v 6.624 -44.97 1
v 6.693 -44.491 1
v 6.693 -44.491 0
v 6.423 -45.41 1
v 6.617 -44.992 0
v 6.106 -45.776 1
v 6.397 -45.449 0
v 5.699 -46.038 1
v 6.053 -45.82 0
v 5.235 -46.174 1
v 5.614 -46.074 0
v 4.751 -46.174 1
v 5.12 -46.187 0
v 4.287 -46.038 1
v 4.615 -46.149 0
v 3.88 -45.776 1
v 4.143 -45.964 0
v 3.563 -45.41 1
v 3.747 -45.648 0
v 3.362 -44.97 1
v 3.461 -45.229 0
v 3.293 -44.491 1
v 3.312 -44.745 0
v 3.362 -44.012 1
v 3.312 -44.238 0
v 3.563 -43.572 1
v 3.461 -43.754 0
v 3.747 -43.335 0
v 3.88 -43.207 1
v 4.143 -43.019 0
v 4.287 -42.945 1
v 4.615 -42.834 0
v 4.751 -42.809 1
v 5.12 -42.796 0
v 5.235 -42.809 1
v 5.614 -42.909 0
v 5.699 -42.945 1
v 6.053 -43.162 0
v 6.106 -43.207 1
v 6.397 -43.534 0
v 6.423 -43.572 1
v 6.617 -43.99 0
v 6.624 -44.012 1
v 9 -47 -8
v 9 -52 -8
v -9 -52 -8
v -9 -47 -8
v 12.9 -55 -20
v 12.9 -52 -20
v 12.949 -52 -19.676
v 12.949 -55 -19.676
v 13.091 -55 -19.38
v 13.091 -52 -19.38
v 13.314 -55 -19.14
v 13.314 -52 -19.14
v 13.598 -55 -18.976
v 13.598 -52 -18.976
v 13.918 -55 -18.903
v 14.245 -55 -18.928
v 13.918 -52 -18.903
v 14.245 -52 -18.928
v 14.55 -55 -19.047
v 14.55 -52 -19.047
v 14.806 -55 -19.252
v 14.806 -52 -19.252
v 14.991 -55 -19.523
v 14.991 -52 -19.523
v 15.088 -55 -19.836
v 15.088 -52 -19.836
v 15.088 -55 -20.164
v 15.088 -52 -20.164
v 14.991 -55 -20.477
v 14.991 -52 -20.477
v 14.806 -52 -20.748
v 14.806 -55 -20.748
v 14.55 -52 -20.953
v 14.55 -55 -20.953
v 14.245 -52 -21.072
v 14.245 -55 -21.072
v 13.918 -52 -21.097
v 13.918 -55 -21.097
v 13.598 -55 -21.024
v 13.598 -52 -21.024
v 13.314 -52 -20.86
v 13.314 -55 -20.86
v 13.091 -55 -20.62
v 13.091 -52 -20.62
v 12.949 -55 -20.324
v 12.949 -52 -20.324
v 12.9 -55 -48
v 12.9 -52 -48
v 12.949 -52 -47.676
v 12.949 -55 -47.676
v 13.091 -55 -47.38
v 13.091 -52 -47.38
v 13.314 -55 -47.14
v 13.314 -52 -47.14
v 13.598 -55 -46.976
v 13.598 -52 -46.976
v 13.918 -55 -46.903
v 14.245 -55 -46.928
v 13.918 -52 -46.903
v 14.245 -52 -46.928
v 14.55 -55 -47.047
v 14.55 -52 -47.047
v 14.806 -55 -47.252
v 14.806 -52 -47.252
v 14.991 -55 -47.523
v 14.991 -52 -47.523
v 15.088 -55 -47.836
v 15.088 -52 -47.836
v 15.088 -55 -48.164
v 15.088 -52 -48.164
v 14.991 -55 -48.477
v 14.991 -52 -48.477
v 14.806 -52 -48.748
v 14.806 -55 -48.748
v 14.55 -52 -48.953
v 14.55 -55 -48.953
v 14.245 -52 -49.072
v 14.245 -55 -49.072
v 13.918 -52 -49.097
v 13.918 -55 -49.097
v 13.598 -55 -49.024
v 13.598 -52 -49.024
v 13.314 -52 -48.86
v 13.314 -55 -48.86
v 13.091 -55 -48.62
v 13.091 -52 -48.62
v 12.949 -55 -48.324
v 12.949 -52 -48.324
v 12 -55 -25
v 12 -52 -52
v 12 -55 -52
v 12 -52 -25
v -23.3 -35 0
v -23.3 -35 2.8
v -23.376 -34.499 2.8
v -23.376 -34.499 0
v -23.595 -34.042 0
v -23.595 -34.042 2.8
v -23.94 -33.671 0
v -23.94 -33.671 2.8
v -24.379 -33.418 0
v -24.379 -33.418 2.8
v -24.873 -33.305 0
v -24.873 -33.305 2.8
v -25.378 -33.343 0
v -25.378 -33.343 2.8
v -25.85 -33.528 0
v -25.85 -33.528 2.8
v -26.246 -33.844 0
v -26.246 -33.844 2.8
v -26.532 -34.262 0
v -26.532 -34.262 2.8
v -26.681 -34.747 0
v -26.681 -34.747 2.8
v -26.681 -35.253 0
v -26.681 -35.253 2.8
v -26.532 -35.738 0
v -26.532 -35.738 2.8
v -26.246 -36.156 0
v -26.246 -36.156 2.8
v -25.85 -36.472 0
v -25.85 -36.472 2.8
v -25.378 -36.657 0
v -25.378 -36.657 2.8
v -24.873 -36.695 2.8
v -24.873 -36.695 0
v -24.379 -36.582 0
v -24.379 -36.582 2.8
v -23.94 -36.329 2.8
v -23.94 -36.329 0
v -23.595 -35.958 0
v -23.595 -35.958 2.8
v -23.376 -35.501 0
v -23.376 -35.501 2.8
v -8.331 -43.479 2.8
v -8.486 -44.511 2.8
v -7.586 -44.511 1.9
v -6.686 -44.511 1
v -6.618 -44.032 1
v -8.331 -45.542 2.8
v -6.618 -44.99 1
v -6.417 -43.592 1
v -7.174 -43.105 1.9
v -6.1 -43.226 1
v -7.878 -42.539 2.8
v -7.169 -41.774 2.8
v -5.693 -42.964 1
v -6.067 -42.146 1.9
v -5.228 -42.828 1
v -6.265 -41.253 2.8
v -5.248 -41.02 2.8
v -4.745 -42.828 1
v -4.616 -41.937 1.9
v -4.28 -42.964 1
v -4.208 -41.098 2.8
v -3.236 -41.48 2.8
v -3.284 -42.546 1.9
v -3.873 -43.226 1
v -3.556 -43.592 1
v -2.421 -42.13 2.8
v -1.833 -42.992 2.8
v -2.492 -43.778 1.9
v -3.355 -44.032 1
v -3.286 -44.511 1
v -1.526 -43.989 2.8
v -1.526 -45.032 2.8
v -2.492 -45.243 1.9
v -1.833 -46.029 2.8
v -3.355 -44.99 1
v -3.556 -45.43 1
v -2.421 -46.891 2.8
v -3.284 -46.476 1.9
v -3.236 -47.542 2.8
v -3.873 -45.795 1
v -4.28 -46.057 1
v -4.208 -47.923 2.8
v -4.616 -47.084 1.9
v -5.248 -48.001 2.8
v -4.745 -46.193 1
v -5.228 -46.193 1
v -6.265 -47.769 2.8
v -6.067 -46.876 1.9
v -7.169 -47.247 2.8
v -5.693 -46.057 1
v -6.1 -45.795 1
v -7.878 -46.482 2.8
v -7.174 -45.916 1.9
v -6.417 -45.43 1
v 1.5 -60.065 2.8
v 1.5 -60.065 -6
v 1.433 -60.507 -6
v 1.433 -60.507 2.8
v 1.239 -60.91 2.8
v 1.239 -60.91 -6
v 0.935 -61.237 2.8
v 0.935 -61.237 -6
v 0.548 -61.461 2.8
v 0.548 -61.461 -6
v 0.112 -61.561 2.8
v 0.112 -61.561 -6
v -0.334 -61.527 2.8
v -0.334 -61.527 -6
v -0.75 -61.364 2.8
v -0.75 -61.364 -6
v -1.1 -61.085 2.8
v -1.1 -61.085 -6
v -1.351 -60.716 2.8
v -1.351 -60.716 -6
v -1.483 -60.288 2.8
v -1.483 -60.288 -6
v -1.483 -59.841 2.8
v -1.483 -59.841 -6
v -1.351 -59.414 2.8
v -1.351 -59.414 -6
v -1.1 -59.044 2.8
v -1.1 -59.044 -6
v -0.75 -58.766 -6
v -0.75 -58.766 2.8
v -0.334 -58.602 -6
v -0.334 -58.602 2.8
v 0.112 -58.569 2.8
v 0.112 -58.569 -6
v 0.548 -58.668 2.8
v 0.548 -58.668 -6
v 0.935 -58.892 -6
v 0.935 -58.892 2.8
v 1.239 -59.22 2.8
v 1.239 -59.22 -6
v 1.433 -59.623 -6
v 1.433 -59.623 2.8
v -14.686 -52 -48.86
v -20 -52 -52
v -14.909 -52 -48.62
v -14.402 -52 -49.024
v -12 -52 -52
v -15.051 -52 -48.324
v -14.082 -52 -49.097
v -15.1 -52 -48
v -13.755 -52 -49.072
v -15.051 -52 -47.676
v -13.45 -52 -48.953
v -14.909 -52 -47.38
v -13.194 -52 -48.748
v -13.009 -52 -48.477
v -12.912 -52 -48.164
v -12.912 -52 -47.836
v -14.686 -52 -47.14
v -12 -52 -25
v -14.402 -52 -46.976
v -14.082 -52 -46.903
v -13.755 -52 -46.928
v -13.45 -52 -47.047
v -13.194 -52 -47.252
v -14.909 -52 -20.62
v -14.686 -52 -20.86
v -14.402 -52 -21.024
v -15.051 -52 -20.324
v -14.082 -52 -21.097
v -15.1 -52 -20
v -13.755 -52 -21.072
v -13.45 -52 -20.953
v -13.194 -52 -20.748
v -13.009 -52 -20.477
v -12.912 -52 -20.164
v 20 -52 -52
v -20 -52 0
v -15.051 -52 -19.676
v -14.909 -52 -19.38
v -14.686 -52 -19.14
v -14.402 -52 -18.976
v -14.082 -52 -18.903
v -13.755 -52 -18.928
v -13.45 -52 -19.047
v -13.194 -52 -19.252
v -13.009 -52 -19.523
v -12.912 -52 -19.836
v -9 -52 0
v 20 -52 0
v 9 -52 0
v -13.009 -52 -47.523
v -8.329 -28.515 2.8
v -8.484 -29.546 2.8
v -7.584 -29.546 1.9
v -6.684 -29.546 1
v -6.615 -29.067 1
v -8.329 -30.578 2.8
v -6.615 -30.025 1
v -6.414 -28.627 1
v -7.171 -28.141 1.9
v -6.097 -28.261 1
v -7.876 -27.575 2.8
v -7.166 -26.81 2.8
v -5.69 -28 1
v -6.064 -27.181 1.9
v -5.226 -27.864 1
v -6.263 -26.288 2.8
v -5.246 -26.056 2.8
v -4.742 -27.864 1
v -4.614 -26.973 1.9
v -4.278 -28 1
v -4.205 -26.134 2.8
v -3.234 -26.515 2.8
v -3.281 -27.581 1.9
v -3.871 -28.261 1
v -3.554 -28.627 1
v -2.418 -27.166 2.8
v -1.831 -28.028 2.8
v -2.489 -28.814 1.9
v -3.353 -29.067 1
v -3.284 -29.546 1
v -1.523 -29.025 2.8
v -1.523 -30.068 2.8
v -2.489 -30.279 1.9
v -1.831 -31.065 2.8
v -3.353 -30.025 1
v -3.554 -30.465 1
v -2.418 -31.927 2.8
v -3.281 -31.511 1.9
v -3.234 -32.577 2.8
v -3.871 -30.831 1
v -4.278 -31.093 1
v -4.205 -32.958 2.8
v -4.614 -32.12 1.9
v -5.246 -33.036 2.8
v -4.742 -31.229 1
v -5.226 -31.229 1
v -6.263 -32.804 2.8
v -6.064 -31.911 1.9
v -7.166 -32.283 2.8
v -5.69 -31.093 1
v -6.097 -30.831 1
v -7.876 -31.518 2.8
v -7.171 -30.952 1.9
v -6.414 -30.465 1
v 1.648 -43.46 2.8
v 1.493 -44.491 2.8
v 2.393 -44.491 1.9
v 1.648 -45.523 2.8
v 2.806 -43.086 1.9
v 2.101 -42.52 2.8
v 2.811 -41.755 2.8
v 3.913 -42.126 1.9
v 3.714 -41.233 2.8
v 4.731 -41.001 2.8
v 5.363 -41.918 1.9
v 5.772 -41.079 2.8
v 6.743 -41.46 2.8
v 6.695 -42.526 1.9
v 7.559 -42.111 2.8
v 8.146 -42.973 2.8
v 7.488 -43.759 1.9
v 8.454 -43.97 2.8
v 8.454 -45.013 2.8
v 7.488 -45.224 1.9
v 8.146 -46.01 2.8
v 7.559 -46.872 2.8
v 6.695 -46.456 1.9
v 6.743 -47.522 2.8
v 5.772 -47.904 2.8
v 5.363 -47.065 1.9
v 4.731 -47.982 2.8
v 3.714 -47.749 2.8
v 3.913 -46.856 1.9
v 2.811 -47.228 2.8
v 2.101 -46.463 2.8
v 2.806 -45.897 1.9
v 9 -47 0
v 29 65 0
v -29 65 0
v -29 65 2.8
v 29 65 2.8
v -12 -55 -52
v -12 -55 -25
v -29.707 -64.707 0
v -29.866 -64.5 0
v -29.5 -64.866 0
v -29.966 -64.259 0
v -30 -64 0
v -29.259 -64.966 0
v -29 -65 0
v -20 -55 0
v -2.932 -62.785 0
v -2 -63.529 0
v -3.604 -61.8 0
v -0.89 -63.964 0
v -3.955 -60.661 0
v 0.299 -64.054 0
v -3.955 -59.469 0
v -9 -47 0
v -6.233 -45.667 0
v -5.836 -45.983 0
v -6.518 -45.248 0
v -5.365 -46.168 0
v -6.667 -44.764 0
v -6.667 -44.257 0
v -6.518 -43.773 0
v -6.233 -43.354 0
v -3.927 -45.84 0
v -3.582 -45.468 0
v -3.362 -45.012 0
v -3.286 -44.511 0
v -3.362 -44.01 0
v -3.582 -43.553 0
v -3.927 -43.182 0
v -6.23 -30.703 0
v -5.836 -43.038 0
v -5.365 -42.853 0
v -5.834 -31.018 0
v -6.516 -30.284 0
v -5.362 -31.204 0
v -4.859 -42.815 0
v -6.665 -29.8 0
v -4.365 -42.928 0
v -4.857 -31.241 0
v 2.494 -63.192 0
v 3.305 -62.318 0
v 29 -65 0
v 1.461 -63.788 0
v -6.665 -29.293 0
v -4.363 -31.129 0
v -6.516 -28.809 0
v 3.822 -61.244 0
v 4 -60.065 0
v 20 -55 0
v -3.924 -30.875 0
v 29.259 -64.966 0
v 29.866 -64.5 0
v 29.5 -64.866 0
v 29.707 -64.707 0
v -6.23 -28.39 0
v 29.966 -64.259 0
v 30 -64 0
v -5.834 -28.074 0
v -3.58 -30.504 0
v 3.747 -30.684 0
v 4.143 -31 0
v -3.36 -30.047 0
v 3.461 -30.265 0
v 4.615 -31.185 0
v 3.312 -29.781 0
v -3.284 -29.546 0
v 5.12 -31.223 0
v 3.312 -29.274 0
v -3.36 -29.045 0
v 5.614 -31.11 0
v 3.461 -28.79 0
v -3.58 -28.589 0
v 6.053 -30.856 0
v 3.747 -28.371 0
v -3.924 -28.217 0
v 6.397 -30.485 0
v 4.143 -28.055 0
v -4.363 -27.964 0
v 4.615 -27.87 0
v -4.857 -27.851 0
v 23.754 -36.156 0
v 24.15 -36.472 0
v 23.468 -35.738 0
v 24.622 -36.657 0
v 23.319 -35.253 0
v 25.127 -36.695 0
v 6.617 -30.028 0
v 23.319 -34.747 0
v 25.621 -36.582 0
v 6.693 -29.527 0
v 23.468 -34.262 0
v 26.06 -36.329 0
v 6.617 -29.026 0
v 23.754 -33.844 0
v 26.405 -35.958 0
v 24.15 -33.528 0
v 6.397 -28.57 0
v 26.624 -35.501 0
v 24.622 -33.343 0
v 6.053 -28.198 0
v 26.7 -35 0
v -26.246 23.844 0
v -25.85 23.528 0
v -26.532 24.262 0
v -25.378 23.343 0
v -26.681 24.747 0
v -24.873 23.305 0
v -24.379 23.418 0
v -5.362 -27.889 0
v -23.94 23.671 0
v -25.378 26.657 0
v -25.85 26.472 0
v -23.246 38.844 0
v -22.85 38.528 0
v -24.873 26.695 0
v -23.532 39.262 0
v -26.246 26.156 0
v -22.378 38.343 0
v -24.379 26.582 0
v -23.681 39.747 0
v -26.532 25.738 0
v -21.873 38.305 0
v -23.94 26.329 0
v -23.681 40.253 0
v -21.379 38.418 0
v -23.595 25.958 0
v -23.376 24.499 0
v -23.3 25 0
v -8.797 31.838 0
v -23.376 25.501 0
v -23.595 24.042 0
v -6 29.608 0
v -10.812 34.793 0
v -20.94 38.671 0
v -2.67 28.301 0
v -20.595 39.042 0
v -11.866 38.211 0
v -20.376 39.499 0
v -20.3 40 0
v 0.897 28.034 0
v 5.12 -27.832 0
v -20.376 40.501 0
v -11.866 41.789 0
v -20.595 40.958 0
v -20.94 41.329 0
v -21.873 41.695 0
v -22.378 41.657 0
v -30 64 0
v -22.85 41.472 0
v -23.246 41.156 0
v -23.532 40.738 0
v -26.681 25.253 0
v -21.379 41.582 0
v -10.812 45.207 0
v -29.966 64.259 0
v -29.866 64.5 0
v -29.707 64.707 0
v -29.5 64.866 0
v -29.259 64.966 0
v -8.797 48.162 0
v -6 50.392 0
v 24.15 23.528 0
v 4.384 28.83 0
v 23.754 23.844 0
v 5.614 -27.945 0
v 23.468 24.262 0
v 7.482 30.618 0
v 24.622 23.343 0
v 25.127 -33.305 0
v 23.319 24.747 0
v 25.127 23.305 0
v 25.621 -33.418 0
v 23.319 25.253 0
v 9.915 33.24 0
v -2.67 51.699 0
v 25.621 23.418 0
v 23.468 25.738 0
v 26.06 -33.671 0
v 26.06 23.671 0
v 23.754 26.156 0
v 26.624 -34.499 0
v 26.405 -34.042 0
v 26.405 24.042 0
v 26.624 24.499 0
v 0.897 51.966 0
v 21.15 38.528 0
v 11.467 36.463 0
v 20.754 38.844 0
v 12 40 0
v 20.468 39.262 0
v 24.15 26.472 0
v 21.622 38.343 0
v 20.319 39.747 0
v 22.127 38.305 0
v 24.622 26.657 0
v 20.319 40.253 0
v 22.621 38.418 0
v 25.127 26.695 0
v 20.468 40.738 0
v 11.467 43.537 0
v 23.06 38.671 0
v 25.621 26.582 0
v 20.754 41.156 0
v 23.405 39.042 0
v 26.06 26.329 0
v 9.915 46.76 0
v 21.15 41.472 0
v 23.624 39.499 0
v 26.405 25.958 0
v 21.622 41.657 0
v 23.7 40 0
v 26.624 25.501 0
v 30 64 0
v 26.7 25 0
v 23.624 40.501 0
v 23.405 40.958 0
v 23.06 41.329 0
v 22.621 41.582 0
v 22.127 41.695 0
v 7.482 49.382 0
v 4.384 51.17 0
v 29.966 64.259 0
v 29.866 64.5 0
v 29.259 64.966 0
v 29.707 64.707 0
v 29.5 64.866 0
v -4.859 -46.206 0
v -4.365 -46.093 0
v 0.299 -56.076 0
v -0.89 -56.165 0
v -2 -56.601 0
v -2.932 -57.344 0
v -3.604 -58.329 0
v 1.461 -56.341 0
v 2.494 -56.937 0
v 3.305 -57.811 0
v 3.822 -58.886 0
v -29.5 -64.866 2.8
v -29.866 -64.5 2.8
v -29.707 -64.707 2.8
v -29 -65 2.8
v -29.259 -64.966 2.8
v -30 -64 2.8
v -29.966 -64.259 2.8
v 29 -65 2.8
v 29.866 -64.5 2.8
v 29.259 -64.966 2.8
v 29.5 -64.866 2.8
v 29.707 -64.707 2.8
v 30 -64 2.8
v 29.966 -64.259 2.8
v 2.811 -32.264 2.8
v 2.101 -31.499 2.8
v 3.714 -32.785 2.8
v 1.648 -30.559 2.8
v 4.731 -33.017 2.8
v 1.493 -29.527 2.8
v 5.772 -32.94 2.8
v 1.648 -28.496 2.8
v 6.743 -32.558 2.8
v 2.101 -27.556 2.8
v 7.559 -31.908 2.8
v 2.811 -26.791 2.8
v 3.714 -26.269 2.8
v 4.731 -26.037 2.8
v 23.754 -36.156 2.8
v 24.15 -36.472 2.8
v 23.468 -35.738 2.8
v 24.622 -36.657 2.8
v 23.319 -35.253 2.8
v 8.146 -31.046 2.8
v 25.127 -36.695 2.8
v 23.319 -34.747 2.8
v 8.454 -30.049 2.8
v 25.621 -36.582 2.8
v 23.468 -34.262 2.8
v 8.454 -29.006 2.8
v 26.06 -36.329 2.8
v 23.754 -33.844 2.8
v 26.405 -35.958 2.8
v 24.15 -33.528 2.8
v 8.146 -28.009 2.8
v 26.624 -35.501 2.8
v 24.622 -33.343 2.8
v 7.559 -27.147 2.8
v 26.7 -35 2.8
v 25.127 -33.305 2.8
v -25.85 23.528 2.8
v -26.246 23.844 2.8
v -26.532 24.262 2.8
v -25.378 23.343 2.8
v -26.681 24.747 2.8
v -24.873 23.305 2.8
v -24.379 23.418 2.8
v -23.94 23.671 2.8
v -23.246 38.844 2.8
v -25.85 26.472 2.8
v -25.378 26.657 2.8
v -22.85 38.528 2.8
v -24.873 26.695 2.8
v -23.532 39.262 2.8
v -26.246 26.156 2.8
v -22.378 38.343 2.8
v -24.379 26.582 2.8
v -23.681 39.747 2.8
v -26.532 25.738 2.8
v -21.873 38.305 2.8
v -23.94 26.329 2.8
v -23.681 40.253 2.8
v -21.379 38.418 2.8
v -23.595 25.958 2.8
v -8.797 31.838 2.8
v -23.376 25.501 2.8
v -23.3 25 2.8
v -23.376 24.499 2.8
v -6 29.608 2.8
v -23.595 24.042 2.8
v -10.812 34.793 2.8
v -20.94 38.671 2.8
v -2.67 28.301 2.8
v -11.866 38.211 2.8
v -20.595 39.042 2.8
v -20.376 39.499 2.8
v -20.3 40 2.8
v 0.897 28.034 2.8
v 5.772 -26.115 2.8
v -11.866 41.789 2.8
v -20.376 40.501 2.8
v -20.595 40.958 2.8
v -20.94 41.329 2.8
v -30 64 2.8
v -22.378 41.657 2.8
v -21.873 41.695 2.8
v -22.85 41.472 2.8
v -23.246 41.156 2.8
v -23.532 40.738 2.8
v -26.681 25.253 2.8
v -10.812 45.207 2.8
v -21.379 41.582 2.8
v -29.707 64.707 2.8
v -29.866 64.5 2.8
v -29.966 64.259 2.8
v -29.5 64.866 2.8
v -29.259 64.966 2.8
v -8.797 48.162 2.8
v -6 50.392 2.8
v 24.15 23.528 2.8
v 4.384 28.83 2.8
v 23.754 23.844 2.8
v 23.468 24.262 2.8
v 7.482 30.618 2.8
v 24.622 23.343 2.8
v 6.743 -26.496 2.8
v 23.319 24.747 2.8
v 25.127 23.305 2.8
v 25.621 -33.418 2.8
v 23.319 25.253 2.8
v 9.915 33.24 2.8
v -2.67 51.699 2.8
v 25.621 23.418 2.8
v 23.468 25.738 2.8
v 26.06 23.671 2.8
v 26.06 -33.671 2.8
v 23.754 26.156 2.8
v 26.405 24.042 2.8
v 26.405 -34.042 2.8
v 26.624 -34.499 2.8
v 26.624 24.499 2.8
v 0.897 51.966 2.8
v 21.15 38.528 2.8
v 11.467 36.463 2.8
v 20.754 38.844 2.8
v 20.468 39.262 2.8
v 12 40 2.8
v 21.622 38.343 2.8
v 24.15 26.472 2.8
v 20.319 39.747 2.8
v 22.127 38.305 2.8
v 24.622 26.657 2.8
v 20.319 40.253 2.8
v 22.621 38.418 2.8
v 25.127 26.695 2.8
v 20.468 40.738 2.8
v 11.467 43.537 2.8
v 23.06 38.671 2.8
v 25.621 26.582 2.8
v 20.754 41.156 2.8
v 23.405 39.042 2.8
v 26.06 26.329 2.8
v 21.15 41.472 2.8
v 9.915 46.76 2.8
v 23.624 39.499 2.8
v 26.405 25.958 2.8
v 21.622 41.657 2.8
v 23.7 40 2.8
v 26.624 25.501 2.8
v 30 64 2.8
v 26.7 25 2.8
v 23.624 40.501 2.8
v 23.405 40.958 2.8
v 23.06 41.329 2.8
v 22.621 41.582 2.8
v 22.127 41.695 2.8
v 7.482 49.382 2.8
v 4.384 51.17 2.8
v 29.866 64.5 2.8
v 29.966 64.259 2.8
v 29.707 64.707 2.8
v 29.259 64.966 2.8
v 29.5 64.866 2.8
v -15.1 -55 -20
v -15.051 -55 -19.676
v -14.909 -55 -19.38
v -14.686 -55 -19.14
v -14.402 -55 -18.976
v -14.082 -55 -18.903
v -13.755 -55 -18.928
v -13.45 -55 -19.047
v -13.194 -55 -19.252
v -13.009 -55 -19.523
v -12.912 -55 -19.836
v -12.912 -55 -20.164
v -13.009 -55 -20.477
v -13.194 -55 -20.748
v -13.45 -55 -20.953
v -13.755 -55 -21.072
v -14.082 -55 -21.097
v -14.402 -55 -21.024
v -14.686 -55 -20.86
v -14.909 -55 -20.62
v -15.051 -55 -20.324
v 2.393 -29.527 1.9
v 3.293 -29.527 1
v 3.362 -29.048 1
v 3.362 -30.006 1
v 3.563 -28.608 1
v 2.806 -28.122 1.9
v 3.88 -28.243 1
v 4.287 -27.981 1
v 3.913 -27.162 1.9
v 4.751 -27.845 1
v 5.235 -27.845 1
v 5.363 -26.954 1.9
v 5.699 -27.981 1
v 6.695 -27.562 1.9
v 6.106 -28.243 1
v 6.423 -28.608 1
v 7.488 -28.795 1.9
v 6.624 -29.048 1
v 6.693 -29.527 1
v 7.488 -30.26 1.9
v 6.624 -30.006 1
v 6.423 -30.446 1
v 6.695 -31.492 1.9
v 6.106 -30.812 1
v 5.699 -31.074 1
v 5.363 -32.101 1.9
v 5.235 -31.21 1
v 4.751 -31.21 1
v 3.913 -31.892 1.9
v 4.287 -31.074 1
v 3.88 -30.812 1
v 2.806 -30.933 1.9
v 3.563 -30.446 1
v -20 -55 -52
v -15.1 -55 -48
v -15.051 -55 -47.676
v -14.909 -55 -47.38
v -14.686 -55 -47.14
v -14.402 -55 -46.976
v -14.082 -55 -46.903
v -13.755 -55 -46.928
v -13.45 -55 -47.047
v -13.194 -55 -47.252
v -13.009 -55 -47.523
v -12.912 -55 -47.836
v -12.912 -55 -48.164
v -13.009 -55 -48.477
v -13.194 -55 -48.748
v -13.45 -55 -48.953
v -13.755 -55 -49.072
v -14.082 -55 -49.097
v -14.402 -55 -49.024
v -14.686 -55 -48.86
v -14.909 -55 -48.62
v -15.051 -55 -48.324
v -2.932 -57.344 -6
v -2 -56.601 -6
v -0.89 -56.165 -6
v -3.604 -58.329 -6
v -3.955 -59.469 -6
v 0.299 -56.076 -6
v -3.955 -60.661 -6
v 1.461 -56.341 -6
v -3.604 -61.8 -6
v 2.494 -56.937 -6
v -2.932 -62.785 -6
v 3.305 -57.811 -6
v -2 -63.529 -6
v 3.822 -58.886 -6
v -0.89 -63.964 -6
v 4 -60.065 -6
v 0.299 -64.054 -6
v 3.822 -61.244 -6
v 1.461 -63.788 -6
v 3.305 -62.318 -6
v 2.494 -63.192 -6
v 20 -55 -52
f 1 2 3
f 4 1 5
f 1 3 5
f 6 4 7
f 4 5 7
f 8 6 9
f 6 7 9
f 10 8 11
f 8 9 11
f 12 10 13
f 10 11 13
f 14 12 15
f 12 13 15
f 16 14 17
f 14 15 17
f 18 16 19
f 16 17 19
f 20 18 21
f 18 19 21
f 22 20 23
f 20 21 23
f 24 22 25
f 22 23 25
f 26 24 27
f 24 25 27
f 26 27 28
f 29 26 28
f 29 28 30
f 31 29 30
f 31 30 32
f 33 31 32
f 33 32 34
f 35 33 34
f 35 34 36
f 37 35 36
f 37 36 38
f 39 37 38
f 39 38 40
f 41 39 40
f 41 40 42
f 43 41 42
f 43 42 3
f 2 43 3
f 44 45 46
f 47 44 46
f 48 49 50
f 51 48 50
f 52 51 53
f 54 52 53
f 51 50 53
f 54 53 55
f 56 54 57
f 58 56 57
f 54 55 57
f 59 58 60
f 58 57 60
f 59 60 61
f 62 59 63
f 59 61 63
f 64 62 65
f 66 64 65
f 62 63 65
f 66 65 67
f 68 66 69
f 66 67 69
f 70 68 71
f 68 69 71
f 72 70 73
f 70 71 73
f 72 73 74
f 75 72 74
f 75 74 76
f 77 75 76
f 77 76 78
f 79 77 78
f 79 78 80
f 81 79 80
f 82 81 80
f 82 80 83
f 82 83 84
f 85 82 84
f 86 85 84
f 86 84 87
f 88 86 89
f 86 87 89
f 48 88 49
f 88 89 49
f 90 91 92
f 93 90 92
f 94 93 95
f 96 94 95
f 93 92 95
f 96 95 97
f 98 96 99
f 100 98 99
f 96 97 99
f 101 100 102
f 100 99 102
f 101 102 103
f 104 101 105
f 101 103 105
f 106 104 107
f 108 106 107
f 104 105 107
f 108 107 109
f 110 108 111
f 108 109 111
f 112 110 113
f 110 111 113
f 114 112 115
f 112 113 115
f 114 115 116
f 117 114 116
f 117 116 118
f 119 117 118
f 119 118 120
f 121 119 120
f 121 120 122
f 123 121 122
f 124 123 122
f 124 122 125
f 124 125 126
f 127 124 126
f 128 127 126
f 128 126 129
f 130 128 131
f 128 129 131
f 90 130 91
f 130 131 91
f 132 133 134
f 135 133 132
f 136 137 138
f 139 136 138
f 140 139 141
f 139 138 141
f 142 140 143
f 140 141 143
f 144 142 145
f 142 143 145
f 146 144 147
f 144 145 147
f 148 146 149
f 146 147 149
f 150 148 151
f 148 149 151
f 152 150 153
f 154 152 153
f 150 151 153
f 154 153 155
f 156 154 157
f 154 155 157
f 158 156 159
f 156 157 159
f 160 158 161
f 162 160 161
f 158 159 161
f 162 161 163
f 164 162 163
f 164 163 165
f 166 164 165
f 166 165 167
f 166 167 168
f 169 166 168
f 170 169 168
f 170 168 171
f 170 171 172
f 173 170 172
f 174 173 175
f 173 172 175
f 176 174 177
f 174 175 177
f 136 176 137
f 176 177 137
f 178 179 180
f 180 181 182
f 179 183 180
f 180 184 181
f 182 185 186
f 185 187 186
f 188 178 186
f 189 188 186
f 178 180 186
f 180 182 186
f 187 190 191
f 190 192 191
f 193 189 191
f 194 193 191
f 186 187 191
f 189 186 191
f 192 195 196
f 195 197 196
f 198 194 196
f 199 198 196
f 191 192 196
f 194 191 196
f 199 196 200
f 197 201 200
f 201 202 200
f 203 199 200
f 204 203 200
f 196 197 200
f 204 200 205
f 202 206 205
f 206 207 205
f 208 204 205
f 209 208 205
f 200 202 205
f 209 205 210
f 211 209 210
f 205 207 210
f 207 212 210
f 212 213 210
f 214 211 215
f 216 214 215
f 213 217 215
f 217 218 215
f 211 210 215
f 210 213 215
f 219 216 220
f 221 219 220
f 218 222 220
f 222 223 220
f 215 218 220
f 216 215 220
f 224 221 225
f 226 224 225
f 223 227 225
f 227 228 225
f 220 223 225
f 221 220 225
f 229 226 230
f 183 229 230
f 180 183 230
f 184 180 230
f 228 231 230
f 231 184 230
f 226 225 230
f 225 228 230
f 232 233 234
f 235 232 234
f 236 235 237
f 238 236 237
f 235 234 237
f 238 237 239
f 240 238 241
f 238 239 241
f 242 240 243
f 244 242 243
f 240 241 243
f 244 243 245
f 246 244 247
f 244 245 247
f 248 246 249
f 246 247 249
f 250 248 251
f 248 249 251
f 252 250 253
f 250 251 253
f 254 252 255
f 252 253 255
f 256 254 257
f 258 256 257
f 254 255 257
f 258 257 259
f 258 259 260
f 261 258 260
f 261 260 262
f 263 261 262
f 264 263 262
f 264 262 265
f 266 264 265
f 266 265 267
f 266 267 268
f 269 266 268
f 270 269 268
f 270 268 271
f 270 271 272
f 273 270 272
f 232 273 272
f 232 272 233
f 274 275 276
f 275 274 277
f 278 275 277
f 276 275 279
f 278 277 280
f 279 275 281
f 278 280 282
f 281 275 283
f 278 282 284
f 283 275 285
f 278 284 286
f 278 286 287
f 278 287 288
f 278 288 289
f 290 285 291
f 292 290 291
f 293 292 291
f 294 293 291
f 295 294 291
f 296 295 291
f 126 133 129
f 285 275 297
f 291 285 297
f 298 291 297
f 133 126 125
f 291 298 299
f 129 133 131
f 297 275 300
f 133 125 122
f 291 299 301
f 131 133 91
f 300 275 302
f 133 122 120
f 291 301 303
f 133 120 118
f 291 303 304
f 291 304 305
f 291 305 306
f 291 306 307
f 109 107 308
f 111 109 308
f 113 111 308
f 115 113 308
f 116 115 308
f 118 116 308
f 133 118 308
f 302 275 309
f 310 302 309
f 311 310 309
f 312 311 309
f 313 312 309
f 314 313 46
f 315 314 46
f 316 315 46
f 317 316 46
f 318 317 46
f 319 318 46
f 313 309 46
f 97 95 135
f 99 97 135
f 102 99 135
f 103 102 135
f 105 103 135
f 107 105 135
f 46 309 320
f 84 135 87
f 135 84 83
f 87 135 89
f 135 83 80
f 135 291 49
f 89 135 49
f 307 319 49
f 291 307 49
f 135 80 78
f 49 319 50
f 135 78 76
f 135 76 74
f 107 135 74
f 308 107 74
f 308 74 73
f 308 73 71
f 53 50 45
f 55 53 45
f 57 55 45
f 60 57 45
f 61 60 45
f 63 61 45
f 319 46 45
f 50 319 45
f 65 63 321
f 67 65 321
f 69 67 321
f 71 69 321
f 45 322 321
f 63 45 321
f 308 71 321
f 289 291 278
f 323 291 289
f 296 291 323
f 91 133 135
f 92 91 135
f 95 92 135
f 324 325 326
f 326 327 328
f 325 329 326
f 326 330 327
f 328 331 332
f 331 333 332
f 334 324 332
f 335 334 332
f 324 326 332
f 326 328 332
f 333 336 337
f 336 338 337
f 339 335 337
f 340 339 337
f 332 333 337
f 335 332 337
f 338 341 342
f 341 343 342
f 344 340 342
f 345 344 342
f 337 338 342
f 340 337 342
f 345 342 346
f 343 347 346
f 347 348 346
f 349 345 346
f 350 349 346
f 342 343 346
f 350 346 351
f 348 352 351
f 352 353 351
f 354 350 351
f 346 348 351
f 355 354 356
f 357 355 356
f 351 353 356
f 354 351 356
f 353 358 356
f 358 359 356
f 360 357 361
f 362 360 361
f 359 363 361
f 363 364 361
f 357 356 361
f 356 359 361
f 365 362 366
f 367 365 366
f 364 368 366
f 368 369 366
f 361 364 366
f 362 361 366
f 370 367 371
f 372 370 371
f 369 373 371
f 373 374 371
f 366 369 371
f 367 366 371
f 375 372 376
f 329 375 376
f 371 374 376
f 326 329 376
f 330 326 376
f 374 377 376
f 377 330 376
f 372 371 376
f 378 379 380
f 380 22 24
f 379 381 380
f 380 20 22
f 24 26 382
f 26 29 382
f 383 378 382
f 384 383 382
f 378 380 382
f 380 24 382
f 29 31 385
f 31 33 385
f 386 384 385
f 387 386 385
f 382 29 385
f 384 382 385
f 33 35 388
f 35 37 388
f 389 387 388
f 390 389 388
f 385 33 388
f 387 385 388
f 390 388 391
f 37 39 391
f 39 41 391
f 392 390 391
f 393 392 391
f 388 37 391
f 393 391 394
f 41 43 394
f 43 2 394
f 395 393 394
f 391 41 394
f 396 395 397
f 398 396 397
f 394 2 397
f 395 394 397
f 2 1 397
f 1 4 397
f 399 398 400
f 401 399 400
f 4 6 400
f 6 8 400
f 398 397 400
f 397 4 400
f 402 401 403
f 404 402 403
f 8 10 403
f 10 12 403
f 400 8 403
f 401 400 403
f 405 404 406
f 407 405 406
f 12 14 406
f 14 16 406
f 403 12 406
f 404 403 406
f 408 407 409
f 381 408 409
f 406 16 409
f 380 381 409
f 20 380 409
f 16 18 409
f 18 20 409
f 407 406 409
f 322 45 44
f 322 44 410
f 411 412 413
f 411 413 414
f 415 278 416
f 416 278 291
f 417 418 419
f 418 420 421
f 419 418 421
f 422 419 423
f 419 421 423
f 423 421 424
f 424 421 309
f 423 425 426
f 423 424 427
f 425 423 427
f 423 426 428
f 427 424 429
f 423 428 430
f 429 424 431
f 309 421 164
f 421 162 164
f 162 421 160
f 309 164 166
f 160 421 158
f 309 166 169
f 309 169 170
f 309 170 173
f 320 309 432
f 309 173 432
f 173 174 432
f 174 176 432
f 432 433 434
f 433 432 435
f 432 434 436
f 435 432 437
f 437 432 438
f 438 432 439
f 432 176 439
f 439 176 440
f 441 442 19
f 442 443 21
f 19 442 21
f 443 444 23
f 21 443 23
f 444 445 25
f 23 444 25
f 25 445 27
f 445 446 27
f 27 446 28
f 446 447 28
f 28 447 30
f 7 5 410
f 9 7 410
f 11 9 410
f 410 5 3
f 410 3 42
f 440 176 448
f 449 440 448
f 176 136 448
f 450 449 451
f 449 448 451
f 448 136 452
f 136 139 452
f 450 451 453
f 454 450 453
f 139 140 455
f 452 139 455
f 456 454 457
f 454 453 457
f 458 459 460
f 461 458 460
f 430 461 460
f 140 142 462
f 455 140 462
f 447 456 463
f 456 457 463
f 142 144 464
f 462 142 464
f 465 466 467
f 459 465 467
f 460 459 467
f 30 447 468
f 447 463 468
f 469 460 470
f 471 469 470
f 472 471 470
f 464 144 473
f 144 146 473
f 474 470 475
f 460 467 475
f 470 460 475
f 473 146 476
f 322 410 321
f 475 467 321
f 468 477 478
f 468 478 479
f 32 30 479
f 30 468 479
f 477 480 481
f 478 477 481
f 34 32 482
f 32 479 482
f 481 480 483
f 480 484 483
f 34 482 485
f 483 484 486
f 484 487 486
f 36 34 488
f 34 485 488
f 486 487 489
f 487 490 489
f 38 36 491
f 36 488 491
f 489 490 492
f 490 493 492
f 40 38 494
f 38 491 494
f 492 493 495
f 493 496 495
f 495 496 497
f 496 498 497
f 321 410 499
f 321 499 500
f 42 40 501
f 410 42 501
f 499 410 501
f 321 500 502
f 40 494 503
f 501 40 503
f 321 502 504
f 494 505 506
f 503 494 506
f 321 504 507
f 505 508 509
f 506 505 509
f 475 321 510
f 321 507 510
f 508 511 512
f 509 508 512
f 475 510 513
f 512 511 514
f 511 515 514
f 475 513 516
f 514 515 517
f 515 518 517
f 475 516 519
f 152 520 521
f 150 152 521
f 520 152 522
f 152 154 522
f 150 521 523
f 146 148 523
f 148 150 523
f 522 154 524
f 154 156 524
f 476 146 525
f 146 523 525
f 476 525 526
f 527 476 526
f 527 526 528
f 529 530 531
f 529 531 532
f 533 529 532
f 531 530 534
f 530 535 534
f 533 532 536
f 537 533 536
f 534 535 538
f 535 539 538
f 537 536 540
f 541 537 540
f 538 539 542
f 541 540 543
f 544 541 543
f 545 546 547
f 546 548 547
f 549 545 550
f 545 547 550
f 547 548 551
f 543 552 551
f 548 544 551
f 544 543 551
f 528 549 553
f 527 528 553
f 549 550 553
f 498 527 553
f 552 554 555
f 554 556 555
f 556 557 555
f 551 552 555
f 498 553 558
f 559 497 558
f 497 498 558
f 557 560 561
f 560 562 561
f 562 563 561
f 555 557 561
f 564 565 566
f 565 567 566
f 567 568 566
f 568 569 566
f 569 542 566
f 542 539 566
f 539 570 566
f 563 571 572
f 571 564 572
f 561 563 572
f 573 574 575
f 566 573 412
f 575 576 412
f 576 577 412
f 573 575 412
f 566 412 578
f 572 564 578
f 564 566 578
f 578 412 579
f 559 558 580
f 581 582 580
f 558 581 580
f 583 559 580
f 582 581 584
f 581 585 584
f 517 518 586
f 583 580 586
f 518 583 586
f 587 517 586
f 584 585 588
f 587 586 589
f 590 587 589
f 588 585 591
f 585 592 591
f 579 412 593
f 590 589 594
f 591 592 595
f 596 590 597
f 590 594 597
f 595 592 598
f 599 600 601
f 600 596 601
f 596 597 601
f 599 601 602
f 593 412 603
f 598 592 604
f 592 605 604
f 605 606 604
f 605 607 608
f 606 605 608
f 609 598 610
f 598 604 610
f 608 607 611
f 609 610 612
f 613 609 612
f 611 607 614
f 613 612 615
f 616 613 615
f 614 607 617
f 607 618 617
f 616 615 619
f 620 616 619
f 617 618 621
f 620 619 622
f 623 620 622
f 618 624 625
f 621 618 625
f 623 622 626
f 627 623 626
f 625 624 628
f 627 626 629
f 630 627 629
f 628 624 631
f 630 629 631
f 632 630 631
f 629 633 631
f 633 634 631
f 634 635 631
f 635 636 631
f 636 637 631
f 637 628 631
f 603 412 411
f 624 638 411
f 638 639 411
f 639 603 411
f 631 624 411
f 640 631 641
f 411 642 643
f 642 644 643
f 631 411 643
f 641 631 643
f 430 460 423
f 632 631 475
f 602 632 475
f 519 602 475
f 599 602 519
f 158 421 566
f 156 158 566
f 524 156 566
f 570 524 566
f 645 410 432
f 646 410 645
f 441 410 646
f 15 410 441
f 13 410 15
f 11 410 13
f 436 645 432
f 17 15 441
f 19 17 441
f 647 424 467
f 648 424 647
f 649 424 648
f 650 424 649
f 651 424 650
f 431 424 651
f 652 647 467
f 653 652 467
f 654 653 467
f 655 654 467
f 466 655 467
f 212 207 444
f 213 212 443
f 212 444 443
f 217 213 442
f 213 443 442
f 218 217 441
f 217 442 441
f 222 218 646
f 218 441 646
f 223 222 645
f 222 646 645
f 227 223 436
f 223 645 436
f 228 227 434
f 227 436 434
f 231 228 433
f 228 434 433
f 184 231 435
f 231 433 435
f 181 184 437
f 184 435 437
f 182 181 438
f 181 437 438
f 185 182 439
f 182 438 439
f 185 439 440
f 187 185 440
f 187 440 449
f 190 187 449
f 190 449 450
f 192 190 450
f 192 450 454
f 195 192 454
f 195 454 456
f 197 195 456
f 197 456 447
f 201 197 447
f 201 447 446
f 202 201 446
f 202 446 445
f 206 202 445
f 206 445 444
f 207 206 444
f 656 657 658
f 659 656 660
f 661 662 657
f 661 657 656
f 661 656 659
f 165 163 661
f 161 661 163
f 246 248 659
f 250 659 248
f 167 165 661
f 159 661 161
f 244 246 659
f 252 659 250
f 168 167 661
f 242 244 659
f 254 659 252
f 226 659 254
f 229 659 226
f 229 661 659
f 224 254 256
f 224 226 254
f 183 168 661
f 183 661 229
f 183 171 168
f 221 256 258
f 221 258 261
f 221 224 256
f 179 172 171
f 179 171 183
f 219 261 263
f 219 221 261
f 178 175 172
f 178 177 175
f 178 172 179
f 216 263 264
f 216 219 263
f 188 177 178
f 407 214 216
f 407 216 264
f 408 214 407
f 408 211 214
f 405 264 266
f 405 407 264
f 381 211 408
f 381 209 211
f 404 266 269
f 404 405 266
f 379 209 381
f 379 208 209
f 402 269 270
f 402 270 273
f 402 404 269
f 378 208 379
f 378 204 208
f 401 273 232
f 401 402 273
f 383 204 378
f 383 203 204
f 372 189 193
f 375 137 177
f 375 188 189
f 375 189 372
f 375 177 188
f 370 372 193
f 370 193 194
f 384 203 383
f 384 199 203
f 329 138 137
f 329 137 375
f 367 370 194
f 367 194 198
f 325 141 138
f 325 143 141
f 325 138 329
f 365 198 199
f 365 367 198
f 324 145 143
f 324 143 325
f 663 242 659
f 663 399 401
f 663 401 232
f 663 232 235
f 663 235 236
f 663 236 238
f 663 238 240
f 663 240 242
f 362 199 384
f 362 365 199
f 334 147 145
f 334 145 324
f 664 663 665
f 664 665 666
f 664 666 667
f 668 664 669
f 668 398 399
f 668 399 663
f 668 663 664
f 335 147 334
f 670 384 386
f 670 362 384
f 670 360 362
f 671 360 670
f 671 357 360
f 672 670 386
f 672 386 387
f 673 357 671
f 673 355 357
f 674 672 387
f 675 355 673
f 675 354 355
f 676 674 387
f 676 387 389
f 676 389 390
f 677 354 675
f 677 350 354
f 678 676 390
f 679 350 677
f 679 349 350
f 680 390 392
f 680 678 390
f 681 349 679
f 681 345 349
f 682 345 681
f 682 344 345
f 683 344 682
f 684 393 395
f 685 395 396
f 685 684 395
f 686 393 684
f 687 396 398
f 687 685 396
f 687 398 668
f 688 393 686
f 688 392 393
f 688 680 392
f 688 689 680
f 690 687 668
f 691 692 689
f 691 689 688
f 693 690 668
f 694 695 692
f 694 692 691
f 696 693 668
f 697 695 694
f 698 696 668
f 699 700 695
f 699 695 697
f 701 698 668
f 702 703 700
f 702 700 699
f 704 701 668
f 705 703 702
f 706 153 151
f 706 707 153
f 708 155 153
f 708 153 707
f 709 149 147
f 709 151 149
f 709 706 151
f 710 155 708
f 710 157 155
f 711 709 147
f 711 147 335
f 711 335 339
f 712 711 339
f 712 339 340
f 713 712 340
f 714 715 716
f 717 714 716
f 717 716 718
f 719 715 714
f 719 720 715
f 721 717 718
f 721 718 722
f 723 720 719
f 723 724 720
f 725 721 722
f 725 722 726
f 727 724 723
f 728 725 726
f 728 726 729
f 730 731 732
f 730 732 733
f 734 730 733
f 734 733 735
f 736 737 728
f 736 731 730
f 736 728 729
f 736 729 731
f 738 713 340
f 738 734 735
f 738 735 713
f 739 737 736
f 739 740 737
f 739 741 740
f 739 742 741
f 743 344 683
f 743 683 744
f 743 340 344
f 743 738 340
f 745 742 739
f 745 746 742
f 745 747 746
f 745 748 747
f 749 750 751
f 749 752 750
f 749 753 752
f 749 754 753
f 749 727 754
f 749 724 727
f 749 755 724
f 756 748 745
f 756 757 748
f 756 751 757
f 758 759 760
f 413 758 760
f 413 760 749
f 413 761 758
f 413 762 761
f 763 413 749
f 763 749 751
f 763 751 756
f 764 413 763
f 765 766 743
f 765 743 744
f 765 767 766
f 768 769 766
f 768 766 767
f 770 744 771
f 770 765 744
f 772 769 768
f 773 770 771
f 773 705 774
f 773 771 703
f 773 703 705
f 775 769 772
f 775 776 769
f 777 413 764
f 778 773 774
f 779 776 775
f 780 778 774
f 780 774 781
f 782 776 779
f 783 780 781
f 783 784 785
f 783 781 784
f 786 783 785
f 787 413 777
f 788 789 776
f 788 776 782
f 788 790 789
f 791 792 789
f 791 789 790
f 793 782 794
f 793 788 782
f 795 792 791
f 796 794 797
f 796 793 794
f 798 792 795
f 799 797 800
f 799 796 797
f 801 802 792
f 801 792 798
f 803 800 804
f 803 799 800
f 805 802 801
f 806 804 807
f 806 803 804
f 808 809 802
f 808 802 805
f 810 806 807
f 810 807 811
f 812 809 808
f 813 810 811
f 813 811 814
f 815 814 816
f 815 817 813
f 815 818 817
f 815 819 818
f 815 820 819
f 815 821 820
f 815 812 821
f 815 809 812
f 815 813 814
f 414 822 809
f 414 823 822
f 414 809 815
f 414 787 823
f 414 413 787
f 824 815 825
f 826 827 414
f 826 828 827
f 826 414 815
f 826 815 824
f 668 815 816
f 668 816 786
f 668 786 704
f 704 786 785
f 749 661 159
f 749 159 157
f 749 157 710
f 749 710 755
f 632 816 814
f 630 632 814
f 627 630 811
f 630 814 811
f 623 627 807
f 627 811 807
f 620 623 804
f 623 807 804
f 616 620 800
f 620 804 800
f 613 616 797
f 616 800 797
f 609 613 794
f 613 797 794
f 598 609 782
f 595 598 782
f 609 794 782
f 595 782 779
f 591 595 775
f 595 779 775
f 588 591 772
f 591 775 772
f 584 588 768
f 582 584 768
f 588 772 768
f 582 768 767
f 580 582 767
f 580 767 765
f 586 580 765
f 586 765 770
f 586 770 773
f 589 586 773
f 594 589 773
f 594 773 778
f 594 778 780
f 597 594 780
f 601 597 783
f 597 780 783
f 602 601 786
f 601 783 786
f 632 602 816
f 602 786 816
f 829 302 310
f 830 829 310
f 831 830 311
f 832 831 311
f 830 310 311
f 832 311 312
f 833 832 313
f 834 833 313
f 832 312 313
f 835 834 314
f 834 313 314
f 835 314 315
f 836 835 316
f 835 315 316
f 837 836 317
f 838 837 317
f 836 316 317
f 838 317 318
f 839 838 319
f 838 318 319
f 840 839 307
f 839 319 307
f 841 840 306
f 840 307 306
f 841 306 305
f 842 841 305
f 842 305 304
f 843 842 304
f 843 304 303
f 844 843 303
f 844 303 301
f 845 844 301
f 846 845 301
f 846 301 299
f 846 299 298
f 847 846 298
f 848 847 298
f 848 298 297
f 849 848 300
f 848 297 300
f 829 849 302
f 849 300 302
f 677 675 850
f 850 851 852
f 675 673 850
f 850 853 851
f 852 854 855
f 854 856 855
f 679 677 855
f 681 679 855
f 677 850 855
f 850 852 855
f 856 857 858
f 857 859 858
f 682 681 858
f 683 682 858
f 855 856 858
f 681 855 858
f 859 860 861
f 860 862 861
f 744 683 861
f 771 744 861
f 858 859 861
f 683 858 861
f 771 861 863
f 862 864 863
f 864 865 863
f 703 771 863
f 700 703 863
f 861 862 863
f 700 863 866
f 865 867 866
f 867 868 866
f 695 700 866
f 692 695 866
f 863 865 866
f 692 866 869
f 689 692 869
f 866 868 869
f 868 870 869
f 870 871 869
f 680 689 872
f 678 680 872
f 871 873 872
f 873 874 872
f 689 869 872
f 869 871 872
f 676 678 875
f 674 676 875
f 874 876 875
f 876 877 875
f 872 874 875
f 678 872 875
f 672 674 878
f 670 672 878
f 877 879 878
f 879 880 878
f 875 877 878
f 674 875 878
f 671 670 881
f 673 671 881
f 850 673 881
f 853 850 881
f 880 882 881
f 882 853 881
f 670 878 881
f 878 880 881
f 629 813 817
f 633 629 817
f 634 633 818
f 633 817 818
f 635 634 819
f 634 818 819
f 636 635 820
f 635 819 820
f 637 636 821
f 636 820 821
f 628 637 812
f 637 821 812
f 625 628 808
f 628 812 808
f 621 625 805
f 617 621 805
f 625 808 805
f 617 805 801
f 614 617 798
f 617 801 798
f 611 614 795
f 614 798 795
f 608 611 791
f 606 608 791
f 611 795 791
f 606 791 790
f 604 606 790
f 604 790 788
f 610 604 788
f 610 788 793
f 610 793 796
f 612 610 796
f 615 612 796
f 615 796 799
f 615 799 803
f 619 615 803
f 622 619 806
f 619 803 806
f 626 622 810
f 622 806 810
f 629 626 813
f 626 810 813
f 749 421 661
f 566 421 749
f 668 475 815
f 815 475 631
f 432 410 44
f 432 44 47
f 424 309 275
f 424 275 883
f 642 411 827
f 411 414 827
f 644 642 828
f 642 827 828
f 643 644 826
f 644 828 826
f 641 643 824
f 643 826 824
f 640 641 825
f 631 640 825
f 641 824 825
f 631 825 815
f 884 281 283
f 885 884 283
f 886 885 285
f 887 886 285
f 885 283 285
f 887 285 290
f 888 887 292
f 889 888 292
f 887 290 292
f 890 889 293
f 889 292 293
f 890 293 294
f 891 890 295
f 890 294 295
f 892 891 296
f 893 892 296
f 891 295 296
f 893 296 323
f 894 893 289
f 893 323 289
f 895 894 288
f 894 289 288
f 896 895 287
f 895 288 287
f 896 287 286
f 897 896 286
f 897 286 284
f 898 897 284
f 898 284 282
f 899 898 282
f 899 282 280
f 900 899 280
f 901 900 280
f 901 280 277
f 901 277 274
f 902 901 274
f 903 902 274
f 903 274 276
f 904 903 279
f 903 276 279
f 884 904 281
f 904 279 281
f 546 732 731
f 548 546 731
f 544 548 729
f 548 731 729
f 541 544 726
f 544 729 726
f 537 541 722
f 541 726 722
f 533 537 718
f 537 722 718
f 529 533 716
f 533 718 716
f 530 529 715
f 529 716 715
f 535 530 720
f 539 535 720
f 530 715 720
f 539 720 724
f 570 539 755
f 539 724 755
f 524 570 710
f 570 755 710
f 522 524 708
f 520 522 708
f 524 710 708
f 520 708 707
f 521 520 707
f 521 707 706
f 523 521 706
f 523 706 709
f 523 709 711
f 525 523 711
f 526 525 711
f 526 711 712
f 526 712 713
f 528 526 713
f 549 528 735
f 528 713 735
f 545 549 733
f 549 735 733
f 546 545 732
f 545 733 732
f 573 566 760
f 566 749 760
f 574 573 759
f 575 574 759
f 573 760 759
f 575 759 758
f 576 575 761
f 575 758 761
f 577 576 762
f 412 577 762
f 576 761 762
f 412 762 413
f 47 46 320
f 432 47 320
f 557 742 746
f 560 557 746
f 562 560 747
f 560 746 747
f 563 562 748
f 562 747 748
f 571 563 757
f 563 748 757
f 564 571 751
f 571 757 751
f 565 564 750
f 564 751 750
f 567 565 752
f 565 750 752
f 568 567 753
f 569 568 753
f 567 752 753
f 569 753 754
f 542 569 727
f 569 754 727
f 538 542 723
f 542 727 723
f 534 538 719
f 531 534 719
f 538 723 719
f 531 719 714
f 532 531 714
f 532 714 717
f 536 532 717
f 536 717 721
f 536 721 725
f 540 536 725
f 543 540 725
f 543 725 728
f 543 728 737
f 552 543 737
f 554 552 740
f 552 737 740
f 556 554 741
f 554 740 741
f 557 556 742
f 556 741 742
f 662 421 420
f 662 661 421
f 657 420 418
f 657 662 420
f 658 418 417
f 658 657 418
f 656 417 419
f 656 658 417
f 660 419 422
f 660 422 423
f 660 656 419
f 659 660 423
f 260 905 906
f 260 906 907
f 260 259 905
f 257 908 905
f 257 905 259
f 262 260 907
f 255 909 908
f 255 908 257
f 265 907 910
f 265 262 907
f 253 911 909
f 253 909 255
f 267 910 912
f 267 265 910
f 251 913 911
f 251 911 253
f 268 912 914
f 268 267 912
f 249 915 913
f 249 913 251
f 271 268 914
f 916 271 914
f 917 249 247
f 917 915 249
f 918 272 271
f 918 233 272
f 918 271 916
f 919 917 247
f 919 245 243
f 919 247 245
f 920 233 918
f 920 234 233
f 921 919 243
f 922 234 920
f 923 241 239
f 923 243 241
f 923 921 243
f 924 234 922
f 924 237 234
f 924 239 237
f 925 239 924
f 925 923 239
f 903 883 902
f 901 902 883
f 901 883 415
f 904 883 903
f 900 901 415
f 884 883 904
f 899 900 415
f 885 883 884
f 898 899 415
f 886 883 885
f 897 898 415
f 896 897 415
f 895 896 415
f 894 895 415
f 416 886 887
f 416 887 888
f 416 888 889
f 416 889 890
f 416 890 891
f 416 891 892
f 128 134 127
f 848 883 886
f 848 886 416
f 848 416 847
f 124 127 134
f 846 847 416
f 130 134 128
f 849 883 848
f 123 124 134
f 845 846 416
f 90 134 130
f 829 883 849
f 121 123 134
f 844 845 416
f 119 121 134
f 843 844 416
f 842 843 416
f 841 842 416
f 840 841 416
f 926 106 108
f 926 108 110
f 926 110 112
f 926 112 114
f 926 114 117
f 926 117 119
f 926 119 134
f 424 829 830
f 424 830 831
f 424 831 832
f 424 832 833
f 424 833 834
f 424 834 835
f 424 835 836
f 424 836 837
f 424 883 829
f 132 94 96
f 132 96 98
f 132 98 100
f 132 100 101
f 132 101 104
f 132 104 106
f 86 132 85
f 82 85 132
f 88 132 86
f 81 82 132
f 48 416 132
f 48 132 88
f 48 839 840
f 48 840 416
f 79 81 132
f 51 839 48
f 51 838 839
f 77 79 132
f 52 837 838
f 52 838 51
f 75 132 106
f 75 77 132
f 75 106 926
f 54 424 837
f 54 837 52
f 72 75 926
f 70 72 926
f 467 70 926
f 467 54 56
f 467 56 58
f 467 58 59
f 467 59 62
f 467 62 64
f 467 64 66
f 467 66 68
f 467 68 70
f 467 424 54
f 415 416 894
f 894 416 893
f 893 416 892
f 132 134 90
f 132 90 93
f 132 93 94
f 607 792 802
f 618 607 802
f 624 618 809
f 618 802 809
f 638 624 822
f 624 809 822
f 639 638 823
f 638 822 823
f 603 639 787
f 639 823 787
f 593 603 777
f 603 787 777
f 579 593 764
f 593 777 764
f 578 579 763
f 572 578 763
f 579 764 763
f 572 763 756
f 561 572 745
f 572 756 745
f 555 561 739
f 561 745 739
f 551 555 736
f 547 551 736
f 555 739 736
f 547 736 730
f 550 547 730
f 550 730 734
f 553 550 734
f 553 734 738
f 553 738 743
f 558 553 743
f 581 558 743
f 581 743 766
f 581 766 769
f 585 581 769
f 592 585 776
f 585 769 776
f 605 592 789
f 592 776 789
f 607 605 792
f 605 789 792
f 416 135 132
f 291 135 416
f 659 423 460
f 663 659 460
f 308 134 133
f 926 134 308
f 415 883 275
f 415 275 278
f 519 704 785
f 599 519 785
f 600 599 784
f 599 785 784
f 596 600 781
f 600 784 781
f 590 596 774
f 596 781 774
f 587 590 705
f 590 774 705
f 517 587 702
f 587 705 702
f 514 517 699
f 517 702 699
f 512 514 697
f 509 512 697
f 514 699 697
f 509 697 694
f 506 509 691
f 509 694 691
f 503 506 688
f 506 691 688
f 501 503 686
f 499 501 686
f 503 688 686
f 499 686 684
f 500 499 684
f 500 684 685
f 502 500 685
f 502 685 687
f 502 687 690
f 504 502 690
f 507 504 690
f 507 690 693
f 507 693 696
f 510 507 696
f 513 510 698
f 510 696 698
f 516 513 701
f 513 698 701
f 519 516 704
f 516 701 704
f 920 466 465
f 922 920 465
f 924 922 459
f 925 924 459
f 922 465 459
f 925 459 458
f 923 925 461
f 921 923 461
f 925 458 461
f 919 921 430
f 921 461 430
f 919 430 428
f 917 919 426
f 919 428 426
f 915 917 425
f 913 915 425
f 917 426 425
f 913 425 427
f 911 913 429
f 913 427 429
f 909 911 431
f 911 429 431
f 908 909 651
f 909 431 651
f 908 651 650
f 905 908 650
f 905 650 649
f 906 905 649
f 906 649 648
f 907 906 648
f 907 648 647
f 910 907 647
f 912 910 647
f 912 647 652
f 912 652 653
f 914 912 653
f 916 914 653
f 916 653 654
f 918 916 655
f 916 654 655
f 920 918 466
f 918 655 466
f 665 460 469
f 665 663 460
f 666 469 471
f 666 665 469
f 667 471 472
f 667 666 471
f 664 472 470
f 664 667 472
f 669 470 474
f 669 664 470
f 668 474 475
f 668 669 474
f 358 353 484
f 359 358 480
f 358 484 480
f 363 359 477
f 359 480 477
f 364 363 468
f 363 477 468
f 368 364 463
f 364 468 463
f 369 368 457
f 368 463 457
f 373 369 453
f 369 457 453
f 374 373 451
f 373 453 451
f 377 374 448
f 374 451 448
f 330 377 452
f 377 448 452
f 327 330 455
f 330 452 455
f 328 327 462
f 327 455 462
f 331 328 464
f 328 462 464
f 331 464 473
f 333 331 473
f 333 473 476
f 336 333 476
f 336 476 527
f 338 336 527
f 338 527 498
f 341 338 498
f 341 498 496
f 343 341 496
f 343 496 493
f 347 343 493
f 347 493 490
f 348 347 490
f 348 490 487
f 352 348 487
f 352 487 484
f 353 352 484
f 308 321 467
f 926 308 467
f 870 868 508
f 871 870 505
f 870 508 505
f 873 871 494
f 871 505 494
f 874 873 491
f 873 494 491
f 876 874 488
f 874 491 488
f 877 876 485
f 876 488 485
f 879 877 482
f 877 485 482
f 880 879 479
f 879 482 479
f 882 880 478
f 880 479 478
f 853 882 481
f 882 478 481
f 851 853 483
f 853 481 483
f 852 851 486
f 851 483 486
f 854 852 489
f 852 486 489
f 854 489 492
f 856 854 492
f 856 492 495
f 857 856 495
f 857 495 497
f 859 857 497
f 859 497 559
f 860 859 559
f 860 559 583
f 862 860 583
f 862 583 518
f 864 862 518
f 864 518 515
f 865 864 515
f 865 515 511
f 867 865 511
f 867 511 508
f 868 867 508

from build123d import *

# Parameters (mm, degrees)
SKETCH_W         = 60
SKETCH_H         = 130
PAD_DEPTH        = 2.8
FILLET_R         = 1
FILLET001_R      = 1
FILLET002_R      = 1
FILLET003_R      = 1
SKETCH001_R      = 12
SKETCH001_R_2    = 1.7
POCKET_DEPTH     = 2.8
SKETCH002_W      = 40
SKETCH002_H      = 3
PAD001_DEPTH     = 52
SKETCH007_R      = 1.1
SKETCH007_W      = 24
SKETCH007_H      = 27.426216
POCKET003_DEPTH  = 3
SKETCH009_W      = 18
SKETCH009_H      = 8
PAD003_DEPTH     = 5
COPYSKETCH010_R  = 4
PAD004_DEPTH     = 6
SKETCH011_R      = 1.5
POCKET005_DEPTH  = 10
SKETCH013_R      = 1.7
POCKET006_DEPTH  = 2.8
SKETCH014_R      = 1.7
POCKET007_DEPTH  = 2.8
POCKET008_DEPTH  = 1
HOLE_D           = 3
HOLE_DEPTH       = 24.098709
HOLE_CSINK_D     = 7
HOLE_CSINK_ANGLE = 90
HOLE_TIPS_R      = 1.5


with BuildPart() as part:
    # Sketch → Pad (new body)
    with BuildSketch(Plane.XY):
        Rectangle(SKETCH_W, SKETCH_H)
    extrude(amount=PAD_DEPTH)

    # Fillet
    fillet_edges = [part.edges().sort_by_distance(p)[0] for p in [
        (-30, 65, 1.4),
    ]]
    fillet(fillet_edges, radius=FILLET_R)

    # Fillet001
    fillet001_edges = [part.edges().sort_by_distance(p)[0] for p in [
        (30, 65, 1.4),
    ]]
    fillet(fillet001_edges, radius=FILLET001_R)

    # Fillet002
    fillet002_edges = [part.edges().sort_by_distance(p)[0] for p in [
        (-30, -65, 1.4),
    ]]
    fillet(fillet002_edges, radius=FILLET002_R)

    # Fillet003
    fillet003_edges = [part.edges().sort_by_distance(p)[0] for p in [
        (30, -65, 1.4),
    ]]
    fillet(fillet003_edges, radius=FILLET003_R)

    # Sketch001 (on Face10 of Fillet003) → Pocket (cut)
    with BuildSketch(Plane.XY.offset(2.8)):
        with Locations((0, 40)):
            Circle(SKETCH001_R)
        with Locations((-22, 40)):
            Circle(SKETCH001_R_2)
        with Locations((22, 40)):
            Circle(SKETCH001_R_2)
        with Locations((-25, -35)):
            Circle(SKETCH001_R_2)
        with Locations((25, -35)):
            Circle(SKETCH001_R_2)
        with Locations((-25, 25)):
            Circle(SKETCH001_R_2)
        with Locations((25, 25)):
            Circle(SKETCH001_R_2)
    extrude(amount=-POCKET_DEPTH, mode=Mode.SUBTRACT)

    # Sketch002 (on Face1 of Pocket) → Pad001 (join)
    with BuildSketch(Plane(origin=(0, 0, 0), x_dir=(1, 0, 0), z_dir=(0, 0, -1))):
        with Locations((0, 53.5)):
            Rectangle(SKETCH002_W, SKETCH002_H)
    extrude(amount=PAD001_DEPTH)

    # Sketch007 (on Face20 of Pad001) → Pocket003 (cut)
    with BuildSketch(Plane(origin=(0, -52, 0), x_dir=(-1, 0, 0), z_dir=(0, 1, 0))):
        with Locations((-14, -48)):
            Circle(SKETCH007_R)
        with Locations((14, -48)):
            Circle(SKETCH007_R)
        with Locations((14, -20)):
            Circle(SKETCH007_R)
        with Locations((-14, -20)):
            Circle(SKETCH007_R)
        with Locations((0, -38.713108)):
            Rectangle(SKETCH007_W, SKETCH007_H)
    extrude(amount=-POCKET003_DEPTH, mode=Mode.SUBTRACT)

    # Sketch009 → Pad003 (join)
    with BuildSketch(Plane(origin=(0, -52, 0), x_dir=(-1, 0, 0), z_dir=(0, 1, 0))):
        with Locations((0, -4)):
            Rectangle(SKETCH009_W, SKETCH009_H)
    extrude(amount=PAD003_DEPTH)

    # CopySketch010 → Pad004 (join)
    with BuildSketch(Plane(origin=(0, 0, 0), x_dir=(1, 0, 0), z_dir=(0, 0, -1))):
        with Locations((0, 60.064695)):
            Circle(COPYSKETCH010_R)
    extrude(amount=PAD004_DEPTH)

    # Sketch011 (on Face26 of Pad004) → Pocket005 (cut)
    with BuildSketch(Plane(origin=(0, 0, -6), x_dir=(1, 0, 0), z_dir=(0, 0, -1))):
        with Locations((0, 60.064695)):
            Circle(SKETCH011_R)
    extrude(amount=-POCKET005_DEPTH, mode=Mode.SUBTRACT)

    # Sketch013 (on Face1 of Pocket005) → Pocket006 (cut)
    with BuildSketch(Plane(origin=(0, 0, 0), x_dir=(1, 0, 0), z_dir=(0, 0, -1))):
        with Locations((-4.986458, 44.510635)):
            Circle(SKETCH013_R)
        with Locations((4.992854, 44.491314)):
            Circle(SKETCH013_R)
        with Locations((-4.984121, 29.546223)):
            Circle(SKETCH013_R)
        with Locations((4.992854, 29.527281)):
            Circle(SKETCH013_R)
    extrude(amount=-POCKET006_DEPTH, mode=Mode.SUBTRACT)

    # Sketch014 (on Face29 of Pocket006) → Pocket007 (cut)
    with BuildSketch(Plane.XY.offset(2.8)):
        with Locations((0, 40)):
            Circle(SKETCH014_R)
        with Locations((-4.984121, -29.546223)):
            Circle(SKETCH014_R)
        with Locations((4.992854, -44.491314)):
            Circle(SKETCH014_R)
        with Locations((-4.986458, -44.510635)):
            Circle(SKETCH014_R)
        with Locations((4.992854, -29.527281)):
            Circle(SKETCH014_R)
    extrude(amount=-POCKET007_DEPTH, mode=Mode.SUBTRACT)

    # Sketch014 (on Face29 of Pocket006) → Pocket008 (cut)
    with BuildSketch(Plane.XY.offset(2.8)):
        with Locations((0, 40)):
            Circle(SKETCH014_R)
        with Locations((-4.984121, -29.546223)):
            Circle(SKETCH014_R)
        with Locations((4.992854, -44.491314)):
            Circle(SKETCH014_R)
        with Locations((-4.986458, -44.510635)):
            Circle(SKETCH014_R)
        with Locations((4.992854, -29.527281)):
            Circle(SKETCH014_R)
    extrude(amount=-POCKET008_DEPTH, mode=Mode.SUBTRACT)

    # Hole
    with Locations(Plane.XY.offset(2.8)):
        with Locations((0, 40), (-4.984121, -29.546223), (4.992854, -44.491314), (-4.986458, -44.510635), (4.992854, -29.527281)):
            CounterSinkHole(HOLE_D / 2, HOLE_CSINK_D / 2, depth=HOLE_DEPTH, counter_sink_angle=HOLE_CSINK_ANGLE)

    # Hole tips → Hole tip 1 section 0
    with BuildSketch(Plane.XY.offset(-21.298709), mode=Mode.PRIVATE) as hole_tip_1_s0:
        with Locations((0, 40)):
            Circle(HOLE_TIPS_R)
    loft([hole_tip_1_s0.sketch, Vertex(0, 40, -22.2)], mode=Mode.SUBTRACT)

    # Hole tips → Hole tip 2 section 0
    with BuildSketch(Plane.XY.offset(-21.298709), mode=Mode.PRIVATE) as hole_tip_2_s0:
        with Locations((-4.984121, -29.546223)):
            Circle(HOLE_TIPS_R)
    loft([hole_tip_2_s0.sketch, Vertex(-4.984121, -29.546223, -22.2)], mode=Mode.SUBTRACT)

    # Hole tips → Hole tip 3 section 0
    with BuildSketch(Plane.XY.offset(-21.298709), mode=Mode.PRIVATE) as hole_tip_3_s0:
        with Locations((4.992854, -44.491314)):
            Circle(HOLE_TIPS_R)
    loft([hole_tip_3_s0.sketch, Vertex(4.992854, -44.491314, -22.2)], mode=Mode.SUBTRACT)

    # Hole tips → Hole tip 4 section 0
    with BuildSketch(Plane.XY.offset(-21.298709), mode=Mode.PRIVATE) as hole_tip_4_s0:
        with Locations((-4.986458, -44.510635)):
            Circle(HOLE_TIPS_R)
    loft([hole_tip_4_s0.sketch, Vertex(-4.986458, -44.510635, -22.2)], mode=Mode.SUBTRACT)

    # Hole tips → Hole tip 5 section 0
    with BuildSketch(Plane.XY.offset(-21.298709), mode=Mode.PRIVATE) as hole_tip_5_s0:
        with Locations((4.992854, -29.527281)):
            Circle(HOLE_TIPS_R)
    loft([hole_tip_5_s0.sketch, Vertex(4.992854, -29.527281, -22.2)], mode=Mode.SUBTRACT)


solid = part.part
